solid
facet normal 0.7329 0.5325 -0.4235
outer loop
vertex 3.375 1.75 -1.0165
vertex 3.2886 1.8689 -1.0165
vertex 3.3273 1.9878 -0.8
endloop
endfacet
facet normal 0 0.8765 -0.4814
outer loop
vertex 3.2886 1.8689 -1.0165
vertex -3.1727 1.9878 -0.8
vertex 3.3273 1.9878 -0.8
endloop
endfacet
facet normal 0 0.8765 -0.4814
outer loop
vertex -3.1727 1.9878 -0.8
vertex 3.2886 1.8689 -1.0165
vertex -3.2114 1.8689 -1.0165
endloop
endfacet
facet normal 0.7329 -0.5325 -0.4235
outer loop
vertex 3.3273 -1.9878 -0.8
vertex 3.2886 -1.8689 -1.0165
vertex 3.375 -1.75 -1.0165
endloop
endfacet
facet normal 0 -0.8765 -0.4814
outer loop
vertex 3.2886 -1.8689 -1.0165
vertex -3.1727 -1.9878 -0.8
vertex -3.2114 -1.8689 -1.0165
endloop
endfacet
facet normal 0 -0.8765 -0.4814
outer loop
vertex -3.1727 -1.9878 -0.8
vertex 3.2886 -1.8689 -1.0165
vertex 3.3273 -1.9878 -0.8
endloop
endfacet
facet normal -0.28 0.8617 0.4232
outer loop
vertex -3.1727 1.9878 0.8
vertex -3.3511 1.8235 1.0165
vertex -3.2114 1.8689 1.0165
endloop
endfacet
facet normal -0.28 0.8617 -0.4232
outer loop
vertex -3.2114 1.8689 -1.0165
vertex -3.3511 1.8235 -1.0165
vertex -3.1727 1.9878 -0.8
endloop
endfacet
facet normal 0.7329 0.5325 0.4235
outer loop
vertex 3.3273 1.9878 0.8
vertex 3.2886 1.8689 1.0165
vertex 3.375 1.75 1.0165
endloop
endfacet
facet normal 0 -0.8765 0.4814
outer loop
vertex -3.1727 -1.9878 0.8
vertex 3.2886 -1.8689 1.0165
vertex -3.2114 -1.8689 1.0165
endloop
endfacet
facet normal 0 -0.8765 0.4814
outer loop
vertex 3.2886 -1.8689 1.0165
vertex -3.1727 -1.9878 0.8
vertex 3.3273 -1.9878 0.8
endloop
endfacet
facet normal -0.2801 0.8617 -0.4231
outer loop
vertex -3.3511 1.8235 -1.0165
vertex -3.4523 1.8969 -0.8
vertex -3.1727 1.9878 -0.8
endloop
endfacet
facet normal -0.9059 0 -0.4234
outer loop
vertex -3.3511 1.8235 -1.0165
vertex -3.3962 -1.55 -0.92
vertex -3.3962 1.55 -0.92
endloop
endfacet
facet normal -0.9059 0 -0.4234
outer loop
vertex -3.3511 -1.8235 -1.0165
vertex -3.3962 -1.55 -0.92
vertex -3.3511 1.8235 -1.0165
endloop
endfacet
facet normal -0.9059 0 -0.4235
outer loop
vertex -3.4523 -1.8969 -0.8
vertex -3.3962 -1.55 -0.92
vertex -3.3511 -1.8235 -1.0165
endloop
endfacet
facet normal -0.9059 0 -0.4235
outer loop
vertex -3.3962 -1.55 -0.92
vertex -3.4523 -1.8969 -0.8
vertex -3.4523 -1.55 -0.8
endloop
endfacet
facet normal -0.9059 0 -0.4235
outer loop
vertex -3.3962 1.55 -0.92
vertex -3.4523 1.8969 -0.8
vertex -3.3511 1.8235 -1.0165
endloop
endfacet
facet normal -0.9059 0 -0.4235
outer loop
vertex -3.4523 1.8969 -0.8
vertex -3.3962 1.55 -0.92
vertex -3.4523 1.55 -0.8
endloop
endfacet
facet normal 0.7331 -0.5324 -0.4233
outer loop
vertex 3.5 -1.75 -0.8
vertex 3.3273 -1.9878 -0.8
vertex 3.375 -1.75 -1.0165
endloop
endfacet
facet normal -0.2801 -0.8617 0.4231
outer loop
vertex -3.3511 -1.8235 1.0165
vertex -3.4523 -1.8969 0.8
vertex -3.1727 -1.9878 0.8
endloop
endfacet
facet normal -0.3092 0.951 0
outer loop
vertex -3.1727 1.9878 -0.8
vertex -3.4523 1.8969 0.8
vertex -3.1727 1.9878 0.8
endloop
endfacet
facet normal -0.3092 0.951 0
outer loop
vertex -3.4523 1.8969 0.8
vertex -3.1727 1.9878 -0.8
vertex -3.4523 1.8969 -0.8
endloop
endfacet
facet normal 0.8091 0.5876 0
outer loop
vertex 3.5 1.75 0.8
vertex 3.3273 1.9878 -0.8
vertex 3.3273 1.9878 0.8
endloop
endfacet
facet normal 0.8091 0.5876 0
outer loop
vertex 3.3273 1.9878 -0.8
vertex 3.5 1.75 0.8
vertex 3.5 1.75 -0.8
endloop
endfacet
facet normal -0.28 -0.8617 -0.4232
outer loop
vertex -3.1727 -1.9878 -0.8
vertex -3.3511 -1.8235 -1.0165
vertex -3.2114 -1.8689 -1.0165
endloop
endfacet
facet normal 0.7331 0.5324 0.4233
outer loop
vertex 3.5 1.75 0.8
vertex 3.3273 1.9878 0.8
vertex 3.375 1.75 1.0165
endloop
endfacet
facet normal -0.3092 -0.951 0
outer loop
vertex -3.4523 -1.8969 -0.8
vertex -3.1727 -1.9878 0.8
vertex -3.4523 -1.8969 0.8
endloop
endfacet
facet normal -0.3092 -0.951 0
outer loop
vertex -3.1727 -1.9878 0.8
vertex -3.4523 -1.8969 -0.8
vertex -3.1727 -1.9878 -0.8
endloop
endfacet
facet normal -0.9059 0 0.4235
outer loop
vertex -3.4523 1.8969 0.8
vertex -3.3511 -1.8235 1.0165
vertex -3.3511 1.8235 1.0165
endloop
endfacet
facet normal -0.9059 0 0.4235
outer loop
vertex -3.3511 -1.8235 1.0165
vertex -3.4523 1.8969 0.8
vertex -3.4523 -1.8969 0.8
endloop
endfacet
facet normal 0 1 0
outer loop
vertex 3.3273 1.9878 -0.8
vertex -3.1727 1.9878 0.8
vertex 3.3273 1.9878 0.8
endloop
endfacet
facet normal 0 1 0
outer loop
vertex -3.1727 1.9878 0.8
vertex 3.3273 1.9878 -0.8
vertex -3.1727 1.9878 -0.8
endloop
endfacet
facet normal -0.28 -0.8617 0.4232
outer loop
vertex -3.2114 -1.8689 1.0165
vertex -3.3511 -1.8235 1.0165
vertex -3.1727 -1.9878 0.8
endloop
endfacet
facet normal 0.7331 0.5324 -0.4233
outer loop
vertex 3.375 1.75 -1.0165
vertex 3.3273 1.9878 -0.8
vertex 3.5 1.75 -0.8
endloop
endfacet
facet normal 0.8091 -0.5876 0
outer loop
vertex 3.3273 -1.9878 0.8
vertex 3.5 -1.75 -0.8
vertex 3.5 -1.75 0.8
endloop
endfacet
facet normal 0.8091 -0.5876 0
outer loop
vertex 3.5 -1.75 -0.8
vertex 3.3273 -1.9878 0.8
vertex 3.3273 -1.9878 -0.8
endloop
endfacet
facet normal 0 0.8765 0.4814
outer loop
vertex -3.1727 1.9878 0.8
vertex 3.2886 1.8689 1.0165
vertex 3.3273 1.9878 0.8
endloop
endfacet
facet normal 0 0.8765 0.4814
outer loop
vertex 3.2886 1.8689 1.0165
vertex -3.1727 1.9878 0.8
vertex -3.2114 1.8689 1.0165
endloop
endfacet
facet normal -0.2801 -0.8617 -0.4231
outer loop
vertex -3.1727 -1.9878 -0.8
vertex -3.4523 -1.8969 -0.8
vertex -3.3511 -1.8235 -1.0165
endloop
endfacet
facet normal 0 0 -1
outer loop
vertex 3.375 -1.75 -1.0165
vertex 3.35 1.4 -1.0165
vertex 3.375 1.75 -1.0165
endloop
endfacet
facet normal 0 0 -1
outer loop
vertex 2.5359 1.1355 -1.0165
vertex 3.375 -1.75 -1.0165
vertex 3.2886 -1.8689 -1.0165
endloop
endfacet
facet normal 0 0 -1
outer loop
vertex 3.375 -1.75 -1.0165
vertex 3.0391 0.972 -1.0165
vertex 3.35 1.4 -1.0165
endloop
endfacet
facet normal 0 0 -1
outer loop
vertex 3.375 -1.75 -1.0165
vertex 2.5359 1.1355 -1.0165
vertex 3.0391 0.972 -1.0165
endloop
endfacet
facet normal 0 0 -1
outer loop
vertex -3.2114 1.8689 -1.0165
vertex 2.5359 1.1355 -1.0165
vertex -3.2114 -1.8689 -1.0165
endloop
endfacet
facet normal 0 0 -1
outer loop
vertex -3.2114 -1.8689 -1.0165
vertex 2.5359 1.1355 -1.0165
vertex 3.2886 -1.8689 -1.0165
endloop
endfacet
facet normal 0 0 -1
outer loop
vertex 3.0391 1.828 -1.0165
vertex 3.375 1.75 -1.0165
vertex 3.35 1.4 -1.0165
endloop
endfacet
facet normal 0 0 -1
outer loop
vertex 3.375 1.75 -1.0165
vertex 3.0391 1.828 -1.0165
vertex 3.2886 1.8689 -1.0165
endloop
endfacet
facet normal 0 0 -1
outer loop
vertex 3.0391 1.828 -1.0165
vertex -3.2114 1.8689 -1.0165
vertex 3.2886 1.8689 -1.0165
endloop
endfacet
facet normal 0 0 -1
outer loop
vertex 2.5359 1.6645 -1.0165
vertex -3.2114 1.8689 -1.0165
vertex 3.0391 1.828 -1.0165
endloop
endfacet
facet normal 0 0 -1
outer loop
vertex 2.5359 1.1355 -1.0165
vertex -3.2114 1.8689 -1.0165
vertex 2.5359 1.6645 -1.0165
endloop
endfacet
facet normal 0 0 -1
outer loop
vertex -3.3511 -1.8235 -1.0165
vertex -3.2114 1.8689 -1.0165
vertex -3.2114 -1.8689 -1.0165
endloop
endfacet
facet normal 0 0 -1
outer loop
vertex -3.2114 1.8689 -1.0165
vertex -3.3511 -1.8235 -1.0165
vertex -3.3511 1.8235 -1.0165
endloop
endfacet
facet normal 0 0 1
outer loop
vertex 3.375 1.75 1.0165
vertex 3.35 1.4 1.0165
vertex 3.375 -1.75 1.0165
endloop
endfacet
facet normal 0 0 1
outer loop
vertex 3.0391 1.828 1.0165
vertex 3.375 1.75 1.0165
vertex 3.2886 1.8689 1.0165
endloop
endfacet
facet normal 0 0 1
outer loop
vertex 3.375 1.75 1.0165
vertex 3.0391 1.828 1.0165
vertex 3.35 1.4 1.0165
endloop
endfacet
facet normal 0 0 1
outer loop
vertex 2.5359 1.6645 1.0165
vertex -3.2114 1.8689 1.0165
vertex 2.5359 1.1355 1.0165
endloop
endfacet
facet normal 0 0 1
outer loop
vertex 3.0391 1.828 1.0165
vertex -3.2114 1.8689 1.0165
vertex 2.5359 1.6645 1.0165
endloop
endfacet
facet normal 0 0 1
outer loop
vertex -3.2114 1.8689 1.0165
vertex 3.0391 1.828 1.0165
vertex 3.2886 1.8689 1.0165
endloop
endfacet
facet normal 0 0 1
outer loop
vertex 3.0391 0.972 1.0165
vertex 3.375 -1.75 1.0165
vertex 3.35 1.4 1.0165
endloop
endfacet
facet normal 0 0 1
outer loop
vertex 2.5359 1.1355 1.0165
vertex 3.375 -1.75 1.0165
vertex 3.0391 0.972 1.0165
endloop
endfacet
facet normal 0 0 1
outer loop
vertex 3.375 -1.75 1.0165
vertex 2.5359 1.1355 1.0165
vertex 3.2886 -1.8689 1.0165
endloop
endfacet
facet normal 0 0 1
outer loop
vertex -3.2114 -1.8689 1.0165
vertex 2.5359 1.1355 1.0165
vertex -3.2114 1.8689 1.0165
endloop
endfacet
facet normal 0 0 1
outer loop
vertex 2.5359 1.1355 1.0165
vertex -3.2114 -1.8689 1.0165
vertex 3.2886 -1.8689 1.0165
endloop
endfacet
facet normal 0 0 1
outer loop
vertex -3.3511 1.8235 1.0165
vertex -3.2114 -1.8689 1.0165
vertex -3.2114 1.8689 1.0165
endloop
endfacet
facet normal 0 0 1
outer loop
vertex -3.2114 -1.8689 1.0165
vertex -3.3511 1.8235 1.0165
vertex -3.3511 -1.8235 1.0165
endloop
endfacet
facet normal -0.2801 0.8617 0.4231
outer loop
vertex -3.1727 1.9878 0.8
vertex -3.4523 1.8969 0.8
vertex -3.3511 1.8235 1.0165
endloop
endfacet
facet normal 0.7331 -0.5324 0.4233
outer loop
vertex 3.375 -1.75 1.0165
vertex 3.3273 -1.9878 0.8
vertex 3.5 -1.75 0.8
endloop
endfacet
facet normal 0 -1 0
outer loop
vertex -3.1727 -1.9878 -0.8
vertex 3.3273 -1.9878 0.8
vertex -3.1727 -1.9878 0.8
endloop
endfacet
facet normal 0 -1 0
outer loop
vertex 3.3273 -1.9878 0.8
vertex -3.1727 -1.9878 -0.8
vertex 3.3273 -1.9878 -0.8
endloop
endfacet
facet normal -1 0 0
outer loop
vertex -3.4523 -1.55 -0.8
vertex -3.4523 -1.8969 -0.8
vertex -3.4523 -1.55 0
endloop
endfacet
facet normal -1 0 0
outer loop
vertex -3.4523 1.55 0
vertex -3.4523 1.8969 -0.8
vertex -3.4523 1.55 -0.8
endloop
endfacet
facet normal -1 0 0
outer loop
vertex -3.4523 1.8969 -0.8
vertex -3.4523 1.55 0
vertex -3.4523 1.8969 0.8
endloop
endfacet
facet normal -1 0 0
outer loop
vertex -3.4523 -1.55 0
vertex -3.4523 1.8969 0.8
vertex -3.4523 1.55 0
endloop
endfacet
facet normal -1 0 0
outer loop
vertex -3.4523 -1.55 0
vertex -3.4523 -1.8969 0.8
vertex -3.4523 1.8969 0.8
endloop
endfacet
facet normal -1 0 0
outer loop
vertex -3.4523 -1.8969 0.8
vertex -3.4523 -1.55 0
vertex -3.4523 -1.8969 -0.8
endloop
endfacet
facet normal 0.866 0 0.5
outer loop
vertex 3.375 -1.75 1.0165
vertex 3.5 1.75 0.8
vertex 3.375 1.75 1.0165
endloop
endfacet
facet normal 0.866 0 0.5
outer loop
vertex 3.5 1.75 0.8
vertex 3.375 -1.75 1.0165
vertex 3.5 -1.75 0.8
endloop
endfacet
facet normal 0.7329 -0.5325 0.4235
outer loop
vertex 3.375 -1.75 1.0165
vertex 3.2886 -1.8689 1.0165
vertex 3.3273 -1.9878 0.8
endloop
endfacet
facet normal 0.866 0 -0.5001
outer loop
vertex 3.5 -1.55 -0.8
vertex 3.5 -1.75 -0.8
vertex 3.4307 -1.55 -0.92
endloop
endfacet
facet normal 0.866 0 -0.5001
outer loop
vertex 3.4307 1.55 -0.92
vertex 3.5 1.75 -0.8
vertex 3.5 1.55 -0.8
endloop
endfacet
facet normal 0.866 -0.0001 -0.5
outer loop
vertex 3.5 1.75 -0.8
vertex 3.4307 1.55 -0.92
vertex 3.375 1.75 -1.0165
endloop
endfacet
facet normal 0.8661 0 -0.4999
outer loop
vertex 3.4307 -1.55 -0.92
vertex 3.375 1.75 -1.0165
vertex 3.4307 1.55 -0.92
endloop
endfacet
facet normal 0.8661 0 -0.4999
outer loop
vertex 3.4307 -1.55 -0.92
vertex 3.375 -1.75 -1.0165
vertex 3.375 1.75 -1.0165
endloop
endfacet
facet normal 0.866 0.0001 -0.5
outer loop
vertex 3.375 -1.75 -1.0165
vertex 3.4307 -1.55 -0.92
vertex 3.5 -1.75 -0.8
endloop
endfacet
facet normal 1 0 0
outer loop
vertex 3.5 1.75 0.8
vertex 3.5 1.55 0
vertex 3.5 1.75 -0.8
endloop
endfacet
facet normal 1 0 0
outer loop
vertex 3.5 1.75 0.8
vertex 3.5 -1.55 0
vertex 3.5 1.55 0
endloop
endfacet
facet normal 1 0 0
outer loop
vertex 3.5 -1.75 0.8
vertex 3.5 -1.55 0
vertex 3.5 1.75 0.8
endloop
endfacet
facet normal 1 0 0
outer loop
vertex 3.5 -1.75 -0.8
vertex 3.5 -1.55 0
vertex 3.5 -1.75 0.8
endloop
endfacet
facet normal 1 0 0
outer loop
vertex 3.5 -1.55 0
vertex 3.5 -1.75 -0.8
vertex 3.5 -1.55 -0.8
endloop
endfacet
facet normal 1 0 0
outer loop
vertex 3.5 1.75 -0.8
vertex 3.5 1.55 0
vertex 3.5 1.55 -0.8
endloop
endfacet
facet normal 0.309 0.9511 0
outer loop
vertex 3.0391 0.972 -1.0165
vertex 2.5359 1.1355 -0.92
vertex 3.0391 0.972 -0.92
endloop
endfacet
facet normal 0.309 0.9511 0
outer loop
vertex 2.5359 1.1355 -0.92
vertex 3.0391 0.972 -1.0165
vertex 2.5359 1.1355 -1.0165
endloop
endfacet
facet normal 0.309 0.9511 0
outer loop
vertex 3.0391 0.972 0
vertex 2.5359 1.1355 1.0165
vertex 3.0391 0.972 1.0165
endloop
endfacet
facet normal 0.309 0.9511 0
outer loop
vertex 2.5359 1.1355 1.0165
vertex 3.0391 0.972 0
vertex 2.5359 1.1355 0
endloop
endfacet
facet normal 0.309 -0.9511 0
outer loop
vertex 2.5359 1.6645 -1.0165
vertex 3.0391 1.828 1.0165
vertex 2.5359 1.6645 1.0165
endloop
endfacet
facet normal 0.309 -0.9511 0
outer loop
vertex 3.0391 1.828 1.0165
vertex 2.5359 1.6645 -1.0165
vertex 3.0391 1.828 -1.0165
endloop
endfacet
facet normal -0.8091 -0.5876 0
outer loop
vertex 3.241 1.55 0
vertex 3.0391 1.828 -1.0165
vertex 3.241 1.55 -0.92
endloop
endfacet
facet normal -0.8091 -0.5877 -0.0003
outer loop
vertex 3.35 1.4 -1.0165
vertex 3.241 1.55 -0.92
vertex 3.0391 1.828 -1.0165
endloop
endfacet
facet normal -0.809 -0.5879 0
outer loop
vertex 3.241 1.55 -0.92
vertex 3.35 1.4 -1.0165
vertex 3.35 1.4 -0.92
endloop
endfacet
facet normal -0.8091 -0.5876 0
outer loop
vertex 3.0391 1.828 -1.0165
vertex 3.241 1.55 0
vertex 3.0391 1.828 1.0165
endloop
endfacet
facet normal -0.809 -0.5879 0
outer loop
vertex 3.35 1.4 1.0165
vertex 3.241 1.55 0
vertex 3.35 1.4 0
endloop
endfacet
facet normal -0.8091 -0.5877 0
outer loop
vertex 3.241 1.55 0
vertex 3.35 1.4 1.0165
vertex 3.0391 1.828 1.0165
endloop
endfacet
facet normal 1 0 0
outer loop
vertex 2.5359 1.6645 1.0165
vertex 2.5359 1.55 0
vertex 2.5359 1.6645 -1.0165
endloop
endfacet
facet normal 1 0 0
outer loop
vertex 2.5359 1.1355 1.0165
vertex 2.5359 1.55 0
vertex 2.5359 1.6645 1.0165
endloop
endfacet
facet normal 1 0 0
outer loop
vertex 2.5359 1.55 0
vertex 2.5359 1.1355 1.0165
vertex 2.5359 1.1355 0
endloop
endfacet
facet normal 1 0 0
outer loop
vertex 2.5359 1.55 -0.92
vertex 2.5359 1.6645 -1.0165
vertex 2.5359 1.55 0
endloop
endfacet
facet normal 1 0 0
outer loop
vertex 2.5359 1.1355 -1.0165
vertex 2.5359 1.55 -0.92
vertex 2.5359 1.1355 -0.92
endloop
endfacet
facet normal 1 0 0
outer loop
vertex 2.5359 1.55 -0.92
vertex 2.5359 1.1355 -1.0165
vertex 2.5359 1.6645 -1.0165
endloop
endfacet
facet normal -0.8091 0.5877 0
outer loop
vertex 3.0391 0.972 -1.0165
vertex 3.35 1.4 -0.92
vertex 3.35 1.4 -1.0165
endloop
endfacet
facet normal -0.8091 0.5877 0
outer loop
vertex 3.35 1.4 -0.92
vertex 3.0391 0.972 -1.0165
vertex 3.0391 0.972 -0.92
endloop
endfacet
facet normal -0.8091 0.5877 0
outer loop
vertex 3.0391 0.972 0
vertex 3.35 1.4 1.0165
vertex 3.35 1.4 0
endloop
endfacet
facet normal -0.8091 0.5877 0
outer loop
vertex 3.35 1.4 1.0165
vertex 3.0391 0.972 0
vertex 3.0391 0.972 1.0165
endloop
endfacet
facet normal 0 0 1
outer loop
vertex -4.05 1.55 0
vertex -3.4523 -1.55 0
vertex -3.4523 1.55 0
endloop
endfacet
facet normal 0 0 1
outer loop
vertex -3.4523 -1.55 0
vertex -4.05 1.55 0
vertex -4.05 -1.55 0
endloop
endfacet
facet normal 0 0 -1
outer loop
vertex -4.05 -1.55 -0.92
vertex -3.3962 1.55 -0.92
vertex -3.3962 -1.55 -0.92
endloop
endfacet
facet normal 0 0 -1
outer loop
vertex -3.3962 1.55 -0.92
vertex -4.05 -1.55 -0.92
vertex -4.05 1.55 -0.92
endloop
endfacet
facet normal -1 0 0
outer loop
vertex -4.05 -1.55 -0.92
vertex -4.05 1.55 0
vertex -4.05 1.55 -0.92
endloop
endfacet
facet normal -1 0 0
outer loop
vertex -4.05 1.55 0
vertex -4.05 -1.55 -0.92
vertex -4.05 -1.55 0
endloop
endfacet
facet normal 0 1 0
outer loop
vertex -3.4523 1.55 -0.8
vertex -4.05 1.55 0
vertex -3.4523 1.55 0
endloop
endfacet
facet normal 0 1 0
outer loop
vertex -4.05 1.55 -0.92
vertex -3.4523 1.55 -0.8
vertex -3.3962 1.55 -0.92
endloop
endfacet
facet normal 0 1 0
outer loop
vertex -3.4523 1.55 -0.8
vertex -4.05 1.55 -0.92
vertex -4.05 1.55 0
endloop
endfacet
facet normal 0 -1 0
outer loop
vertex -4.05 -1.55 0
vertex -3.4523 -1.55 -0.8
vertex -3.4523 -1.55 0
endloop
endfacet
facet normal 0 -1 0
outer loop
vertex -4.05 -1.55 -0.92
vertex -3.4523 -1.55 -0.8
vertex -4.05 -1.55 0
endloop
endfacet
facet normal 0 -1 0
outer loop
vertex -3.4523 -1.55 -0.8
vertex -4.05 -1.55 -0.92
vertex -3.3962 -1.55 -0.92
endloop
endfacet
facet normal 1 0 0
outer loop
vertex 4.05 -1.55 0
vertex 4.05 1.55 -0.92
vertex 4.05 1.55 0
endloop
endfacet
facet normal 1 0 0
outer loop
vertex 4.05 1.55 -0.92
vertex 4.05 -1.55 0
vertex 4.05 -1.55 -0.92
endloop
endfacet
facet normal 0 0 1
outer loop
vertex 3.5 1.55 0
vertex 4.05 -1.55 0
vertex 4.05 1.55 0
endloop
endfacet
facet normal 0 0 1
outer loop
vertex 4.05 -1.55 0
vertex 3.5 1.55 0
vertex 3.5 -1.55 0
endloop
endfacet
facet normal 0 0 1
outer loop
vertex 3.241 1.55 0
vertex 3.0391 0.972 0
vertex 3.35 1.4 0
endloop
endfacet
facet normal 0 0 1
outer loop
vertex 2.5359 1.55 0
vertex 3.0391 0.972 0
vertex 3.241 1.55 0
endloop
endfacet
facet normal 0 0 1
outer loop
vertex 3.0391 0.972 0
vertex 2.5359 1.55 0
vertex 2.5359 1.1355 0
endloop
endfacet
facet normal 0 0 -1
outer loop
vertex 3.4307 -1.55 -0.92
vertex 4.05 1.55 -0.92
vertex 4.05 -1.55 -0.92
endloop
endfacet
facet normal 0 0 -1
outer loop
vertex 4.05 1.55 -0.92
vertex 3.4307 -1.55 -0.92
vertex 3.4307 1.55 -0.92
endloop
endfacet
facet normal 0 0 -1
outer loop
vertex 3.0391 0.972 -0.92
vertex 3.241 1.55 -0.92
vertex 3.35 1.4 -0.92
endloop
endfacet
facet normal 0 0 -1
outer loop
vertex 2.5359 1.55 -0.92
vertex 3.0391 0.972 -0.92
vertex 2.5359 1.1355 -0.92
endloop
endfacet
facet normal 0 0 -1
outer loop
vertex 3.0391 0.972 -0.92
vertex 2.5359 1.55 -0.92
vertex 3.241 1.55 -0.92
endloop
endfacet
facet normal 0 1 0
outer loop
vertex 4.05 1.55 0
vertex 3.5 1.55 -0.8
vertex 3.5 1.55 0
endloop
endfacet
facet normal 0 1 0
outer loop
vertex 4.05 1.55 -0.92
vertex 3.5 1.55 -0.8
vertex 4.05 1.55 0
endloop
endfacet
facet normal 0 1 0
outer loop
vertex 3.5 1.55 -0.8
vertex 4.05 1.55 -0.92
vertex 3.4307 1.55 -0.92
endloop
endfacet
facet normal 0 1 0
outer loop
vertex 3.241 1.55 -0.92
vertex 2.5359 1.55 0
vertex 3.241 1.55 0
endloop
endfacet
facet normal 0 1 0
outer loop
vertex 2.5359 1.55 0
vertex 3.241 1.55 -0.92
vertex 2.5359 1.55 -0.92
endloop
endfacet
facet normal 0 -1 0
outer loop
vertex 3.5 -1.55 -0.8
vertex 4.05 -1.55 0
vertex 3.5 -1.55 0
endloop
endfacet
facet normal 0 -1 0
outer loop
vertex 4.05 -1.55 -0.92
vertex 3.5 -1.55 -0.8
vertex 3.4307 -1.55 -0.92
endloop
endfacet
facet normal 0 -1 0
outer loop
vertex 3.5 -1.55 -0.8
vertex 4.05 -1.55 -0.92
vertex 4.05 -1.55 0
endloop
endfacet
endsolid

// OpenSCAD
// Parameters
body_length = 6.5; //[3.25:13:0.1]
body_width = 3.5; //[1.75:7:0.1]
body_height = 1.6; //[0.8:3.2:0.05]
notch_radius = 0.45; //[0.2:0.9:0.05]
notch_depth = 0.35; //[0.15:0.8:0.05]
chamfer = 0.25; //[0.1:0.6:0.05]
pad_length = 1.1; //[0.6:2.2:0.05]
pad_thickness = 0.12; //[0.05:0.3:0.01]
pad_inset_y = 0.2; //[0:0.8:0.05]
overlap = 0.8; //[0.5:2:0.1]

// Main body with chamfers
module main_body() {
  difference() {
    minkowski() {
      cube([body_length, body_width, body_height], center=true);
      sphere(r=chamfer);
    }
    translate([body_length/2 - notch_depth, body_width/2 - notch_depth, 0])
      cylinder(r=notch_radius, h=body_height + 2*chamfer + 2, center=true);
  }
}

// Terminal pads
module terminal_pads() {
  union() {
    translate([-(body_length/2) + (pad_length + overlap)/2 - overlap, 0, -(body_height/2) - (pad_thickness + overlap)/2 + overlap])
      cube([pad_length + overlap, body_width - 2*pad_inset_y, pad_thickness + overlap], center=true);
    translate([(body_length/2) - (pad_length + overlap)/2 + overlap, 0, -(body_height/2) - (pad_thickness + overlap)/2 + overlap])
      cube([pad_length + overlap, body_width - 2*pad_inset_y, pad_thickness + overlap], center=true);
  }
}

// Final SMD package
module smd_package() {
  color([0.85, 0.85, 0.8]) // Off-white for the main body
    main_body();
  color([0.2, 0.2, 0.2]) // Dark color for the pads
    terminal_pads();
}

// Render the SMD package
smd_package();
